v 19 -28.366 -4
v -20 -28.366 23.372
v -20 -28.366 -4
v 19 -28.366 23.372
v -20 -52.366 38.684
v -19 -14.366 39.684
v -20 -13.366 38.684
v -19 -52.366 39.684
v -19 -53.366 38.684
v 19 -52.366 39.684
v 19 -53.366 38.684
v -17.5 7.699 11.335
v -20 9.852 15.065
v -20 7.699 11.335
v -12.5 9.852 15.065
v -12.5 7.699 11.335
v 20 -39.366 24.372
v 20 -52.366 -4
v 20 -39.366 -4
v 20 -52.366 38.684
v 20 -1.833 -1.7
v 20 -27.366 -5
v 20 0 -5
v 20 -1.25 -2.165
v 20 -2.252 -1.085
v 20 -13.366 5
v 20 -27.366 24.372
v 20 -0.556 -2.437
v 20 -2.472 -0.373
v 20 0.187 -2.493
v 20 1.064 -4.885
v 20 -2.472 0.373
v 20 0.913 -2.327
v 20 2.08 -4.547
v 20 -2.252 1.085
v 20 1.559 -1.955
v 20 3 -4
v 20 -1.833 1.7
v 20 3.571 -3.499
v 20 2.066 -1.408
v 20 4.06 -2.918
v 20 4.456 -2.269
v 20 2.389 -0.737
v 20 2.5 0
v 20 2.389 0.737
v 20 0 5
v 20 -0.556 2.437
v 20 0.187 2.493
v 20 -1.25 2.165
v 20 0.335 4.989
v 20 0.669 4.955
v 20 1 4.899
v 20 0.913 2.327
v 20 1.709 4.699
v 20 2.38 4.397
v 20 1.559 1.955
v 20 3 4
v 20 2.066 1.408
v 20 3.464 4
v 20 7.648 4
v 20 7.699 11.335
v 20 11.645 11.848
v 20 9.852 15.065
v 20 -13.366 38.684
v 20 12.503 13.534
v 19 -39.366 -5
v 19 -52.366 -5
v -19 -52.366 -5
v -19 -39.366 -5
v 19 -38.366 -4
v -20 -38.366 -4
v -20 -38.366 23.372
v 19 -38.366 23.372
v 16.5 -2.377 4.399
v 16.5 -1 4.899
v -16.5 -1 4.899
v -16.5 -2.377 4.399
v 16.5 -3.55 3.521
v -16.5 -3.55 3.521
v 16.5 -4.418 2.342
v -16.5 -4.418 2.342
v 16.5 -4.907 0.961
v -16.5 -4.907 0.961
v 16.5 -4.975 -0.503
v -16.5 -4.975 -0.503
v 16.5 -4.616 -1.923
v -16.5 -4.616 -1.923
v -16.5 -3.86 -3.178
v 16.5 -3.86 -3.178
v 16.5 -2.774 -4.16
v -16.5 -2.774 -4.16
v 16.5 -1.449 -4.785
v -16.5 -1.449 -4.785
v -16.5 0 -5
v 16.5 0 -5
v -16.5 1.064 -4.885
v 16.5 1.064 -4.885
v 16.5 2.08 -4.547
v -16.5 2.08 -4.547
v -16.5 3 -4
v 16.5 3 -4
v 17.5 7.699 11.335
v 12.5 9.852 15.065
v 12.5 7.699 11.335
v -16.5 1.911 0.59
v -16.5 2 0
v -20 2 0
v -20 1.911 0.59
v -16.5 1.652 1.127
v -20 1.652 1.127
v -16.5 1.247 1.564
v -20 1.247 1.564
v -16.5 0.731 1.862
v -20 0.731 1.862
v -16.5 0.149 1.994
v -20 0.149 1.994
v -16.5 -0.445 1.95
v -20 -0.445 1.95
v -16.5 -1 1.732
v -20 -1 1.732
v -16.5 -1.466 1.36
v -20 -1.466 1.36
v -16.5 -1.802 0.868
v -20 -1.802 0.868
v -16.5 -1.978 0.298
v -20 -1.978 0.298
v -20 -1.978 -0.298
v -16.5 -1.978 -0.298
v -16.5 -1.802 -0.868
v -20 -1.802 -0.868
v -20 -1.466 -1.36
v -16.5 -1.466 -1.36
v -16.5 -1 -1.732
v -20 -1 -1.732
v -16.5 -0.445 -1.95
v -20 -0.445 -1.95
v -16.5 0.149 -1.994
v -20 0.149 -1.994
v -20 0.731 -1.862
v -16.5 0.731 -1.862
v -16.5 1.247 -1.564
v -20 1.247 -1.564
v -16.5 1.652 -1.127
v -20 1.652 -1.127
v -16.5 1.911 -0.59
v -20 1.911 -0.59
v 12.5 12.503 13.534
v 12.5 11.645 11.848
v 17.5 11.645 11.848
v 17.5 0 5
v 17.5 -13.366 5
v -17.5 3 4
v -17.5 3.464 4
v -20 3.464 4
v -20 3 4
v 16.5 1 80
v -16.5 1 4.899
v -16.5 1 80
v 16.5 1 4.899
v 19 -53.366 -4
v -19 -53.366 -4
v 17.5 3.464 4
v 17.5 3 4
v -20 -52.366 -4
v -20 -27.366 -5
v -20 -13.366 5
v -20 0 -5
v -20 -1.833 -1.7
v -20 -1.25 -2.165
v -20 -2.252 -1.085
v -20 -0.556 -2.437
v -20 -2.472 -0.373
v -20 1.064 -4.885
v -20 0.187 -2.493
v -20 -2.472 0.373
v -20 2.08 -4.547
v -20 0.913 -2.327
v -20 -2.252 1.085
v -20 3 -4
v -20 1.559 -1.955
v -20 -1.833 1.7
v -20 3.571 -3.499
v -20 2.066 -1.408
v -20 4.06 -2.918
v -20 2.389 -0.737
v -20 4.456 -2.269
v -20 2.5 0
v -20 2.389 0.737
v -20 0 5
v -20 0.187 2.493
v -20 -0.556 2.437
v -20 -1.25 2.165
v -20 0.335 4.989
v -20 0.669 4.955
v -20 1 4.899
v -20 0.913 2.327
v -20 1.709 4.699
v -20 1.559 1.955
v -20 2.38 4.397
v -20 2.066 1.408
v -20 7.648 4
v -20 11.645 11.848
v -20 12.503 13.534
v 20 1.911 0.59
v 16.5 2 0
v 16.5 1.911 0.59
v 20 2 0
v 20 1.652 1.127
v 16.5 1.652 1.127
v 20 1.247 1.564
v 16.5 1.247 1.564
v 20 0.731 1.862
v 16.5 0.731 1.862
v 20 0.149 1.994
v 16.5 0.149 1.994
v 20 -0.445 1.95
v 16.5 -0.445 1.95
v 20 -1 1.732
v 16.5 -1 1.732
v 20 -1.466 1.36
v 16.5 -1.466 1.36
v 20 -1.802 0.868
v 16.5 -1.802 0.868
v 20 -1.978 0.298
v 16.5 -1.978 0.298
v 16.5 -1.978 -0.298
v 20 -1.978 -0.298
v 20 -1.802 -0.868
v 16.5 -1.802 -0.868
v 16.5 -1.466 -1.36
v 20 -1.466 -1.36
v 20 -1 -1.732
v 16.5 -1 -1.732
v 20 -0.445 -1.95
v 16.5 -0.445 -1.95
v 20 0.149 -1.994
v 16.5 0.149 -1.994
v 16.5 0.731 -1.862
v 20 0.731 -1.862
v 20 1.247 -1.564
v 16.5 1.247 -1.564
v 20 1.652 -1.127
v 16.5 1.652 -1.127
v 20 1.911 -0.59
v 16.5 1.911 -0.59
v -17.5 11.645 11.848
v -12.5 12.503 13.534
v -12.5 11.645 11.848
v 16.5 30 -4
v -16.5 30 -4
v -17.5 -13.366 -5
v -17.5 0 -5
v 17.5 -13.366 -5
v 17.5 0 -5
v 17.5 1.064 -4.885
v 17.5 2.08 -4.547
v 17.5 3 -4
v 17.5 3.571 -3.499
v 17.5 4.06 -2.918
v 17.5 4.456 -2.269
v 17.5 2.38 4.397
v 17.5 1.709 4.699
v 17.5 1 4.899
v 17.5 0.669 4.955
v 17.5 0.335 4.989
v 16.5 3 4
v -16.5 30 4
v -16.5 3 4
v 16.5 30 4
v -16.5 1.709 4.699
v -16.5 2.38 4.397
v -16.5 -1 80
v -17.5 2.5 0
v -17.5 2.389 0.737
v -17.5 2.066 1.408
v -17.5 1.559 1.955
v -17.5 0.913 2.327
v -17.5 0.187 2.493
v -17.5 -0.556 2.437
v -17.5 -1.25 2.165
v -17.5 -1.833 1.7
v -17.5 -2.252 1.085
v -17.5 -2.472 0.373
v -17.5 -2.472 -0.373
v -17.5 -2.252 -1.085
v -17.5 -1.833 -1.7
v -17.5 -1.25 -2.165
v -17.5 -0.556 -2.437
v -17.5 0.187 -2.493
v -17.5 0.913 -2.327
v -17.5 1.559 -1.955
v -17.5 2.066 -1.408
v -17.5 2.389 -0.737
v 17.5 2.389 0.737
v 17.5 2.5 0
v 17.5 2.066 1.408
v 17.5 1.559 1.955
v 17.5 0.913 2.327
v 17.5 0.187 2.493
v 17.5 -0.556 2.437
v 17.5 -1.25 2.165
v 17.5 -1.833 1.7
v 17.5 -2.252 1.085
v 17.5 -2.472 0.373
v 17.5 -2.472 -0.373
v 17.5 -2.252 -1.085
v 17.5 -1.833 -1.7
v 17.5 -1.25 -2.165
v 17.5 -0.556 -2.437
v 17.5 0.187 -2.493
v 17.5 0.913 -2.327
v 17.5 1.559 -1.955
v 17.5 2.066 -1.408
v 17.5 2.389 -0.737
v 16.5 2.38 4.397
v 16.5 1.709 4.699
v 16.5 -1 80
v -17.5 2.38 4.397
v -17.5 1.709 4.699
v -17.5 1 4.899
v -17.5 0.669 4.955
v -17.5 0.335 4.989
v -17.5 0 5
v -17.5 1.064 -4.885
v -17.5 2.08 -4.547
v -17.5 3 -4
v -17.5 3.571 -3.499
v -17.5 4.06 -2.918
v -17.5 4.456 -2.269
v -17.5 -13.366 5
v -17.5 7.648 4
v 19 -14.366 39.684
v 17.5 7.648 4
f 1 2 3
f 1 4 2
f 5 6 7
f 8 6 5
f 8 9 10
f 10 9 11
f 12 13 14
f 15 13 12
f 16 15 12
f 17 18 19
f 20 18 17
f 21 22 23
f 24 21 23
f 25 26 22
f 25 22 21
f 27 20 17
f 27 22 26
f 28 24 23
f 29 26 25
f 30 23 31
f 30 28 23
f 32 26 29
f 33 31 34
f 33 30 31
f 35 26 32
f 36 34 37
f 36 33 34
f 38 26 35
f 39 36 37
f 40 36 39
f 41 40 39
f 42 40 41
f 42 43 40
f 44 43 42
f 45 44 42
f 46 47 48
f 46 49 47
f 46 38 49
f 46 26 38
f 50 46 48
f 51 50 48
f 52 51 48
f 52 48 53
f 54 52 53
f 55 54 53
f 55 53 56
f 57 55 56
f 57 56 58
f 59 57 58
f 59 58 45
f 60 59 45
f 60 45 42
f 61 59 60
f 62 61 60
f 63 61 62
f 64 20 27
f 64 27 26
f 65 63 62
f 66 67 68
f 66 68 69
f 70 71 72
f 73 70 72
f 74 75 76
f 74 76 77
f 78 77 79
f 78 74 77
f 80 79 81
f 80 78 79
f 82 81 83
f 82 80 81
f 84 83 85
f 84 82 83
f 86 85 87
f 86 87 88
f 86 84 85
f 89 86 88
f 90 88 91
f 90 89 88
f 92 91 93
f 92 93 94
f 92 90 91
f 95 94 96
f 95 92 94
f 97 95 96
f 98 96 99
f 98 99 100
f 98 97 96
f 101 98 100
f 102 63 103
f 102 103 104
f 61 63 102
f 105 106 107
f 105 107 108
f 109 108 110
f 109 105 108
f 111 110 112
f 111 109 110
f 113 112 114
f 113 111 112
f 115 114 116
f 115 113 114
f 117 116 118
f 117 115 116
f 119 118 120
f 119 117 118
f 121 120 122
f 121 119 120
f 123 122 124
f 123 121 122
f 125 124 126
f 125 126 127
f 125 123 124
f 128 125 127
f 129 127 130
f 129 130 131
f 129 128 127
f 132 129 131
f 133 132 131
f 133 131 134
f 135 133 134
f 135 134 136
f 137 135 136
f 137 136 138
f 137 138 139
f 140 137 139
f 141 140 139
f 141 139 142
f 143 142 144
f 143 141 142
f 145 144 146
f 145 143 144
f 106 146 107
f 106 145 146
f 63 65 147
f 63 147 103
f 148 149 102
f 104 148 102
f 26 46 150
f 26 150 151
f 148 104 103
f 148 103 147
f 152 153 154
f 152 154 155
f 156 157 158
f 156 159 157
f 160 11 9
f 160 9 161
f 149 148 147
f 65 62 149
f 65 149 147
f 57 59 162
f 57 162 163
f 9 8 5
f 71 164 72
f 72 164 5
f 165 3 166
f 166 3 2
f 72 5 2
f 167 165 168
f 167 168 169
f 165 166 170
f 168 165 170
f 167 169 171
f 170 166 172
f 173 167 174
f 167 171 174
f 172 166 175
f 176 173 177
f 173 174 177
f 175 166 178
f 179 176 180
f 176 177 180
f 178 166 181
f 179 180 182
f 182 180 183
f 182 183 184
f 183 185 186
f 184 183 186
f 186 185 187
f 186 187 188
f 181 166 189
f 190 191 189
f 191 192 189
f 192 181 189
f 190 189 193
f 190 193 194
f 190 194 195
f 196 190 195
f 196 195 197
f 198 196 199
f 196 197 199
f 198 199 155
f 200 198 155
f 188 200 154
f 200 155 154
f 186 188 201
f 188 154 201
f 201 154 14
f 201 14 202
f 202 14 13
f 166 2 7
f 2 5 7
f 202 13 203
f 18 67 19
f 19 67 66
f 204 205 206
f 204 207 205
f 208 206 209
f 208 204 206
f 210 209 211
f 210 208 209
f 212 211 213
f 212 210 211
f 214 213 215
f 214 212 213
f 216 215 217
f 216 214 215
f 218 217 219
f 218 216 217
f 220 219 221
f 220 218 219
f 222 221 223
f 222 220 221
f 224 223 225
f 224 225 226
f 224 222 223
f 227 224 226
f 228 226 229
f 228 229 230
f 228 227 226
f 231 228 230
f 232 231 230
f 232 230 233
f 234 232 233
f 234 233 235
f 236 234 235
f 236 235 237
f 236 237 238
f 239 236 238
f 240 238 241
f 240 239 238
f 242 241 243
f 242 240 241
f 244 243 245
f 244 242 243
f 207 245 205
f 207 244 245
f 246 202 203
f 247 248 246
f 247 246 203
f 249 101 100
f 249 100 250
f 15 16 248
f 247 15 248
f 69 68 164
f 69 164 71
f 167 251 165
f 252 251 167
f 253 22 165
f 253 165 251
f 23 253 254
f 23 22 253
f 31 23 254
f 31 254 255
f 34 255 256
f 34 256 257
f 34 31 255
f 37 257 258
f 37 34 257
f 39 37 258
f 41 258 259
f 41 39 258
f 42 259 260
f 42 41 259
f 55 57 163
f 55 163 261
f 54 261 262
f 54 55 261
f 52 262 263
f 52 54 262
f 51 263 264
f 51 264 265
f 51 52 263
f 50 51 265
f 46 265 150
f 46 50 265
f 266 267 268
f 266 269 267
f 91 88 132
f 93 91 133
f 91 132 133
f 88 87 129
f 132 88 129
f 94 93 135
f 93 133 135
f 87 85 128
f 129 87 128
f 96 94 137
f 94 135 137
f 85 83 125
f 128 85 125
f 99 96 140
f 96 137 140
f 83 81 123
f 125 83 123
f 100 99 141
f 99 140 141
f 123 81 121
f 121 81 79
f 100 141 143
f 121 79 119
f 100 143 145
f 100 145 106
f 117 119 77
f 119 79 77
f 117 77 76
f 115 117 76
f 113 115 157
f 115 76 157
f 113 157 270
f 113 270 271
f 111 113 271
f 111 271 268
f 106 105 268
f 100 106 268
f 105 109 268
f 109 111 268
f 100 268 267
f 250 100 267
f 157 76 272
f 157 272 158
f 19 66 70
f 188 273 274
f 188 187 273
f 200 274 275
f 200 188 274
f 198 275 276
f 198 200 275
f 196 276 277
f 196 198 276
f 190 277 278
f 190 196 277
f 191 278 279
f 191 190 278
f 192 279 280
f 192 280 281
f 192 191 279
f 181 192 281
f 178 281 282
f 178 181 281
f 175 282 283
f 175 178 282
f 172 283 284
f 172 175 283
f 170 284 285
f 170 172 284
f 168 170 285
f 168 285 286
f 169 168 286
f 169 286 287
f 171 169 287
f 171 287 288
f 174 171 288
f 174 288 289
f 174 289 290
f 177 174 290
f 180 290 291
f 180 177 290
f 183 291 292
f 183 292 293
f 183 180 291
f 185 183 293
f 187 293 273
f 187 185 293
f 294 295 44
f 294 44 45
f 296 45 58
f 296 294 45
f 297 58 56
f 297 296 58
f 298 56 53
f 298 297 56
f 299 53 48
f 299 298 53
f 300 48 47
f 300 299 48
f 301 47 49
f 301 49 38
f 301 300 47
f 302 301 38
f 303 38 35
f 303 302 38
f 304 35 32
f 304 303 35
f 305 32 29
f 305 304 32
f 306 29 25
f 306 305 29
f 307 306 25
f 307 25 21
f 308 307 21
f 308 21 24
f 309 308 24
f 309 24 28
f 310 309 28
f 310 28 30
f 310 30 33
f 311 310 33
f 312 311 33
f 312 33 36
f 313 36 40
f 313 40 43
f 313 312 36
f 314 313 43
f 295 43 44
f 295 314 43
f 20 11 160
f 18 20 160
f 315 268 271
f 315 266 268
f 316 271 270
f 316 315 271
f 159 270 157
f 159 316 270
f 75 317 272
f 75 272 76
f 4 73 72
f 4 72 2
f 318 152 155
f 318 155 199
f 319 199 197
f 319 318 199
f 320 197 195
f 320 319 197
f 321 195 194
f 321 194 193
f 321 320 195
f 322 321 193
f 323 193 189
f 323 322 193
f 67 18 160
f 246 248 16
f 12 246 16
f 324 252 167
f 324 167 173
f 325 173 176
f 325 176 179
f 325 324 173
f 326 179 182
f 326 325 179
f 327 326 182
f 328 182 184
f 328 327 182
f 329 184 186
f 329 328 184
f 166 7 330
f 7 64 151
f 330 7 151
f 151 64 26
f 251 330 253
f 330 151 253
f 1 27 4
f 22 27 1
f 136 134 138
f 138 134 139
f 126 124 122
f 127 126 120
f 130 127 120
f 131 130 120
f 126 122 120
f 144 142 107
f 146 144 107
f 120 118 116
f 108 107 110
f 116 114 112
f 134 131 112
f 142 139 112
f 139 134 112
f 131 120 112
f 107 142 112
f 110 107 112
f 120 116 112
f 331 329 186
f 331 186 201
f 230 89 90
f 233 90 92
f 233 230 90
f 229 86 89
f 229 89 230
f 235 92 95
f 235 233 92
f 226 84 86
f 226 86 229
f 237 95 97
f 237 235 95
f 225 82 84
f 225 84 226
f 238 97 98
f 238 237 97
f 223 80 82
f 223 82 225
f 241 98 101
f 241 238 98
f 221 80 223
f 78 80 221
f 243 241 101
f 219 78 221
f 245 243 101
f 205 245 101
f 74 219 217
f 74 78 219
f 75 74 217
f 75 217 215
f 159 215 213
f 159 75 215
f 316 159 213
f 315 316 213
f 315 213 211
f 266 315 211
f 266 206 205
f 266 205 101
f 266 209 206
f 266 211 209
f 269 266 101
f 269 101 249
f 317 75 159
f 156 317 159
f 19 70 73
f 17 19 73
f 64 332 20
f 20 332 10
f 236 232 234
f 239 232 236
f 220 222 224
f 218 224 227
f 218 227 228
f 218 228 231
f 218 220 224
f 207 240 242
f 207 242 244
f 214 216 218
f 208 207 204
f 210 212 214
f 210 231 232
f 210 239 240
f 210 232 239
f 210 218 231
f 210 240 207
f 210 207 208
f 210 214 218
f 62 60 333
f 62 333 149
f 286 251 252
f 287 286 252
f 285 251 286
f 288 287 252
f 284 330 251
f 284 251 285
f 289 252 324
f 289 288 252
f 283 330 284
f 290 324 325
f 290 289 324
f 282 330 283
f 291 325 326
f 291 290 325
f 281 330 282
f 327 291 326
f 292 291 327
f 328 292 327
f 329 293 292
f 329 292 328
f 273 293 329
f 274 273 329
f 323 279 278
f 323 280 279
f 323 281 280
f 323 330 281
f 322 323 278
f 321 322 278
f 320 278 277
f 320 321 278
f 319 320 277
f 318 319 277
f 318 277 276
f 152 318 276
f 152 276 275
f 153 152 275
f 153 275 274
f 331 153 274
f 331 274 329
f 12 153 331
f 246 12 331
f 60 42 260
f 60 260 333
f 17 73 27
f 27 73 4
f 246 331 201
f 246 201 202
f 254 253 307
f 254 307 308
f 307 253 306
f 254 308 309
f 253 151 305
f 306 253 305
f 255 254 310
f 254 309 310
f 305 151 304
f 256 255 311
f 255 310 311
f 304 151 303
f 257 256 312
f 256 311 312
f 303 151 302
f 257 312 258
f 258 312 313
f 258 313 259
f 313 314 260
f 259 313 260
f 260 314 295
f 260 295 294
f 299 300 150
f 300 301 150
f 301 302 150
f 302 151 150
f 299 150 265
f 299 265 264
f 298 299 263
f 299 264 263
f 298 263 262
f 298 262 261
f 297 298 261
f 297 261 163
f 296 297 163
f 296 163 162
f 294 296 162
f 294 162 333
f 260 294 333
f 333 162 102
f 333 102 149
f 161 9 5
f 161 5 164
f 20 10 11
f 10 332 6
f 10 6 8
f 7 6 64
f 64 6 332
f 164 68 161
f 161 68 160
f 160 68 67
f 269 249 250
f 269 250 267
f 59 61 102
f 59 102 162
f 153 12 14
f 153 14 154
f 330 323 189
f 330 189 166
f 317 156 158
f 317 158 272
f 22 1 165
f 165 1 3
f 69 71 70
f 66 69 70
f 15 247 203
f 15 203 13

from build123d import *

# Parameters (mm, degrees)
F0_R     = 2.5
F1_DEPTH = 20
F2_DEPTH = 17.5
F0_R_2   = 2
F3_DEPTH = 16.5
F4_DEPTH = 20
F5_DEPTH = 12.5
F6_SIZE  = 1


# Not quite as in the source:
# - a feature names something its author has since deleted; it is built from what else it names


with BuildPart() as f1:
    # F0 (on Right) → F1 (new body, symmetric)
    with BuildSketch(Plane.YZ):
        with BuildLine():
            Line((-13.3660271764, -5), (0, -5))
            ThreePointArc((0, -5), (-4.974680765, -0.50254481), (-1, 4.8989794856))
            Line((-1, 4.8989794856), (-1, 5))
            Line((-1, 5), (-13.3660271764, 5))
            Line((-13.3660271764, 5), (-13.3660271764, -5))
        make_face()
        Polygon((-28.3660271764, -5), (-13.3660271764, -5), (-13.3660271764, 5), (-13.3660271764, 39.6839417517), (-53.3660271764, 39.6839417517), (-53.3660271764, 5), (-53.3660271764, -5), (-38.3660271764, -5), (-38.3660271764, 23.3722571284), (-28.3660271764, 23.3722571284), align=None)
        with BuildLine():
            ThreePointArc((-1, 4.8989794856), (-4.974680765, -0.50254481), (0, -5))
            ThreePointArc((0, -5), (1.5811388301, -4.7434164903), (3, -4))
            Line((3, -4), (3, 4))
            ThreePointArc((3, 4), (2.0498880528, 4.5604779323), (1, 4.8989794856))
            Line((1, 4.8989794856), (-1, 4.8989794856))
        make_face()
        Circle(F0_R, mode=Mode.SUBTRACT)
        with BuildLine():
            ThreePointArc((0, 5), (-0.50254481, 4.974680765), (-1, 4.8989794856))
            Line((-1, 4.8989794856), (1, 4.8989794856))
            ThreePointArc((1, 4.8989794856), (0.50254481, 4.974680765), (0, 5))
        make_face()
        with BuildLine():
            Line((-1, 5), (-1, 4.8989794856))
            ThreePointArc((-1, 4.8989794856), (-0.50254481, 4.974680765), (0, 5))
            Line((0, 5), (-1, 5))
        make_face()
        with BuildLine():
            Line((3, 4), (3, -4))
            ThreePointArc((3, -4), (3.8269094248, -3.2178819516), (4.4555102649, -2.2690148257))
            ThreePointArc((4.4555102649, -2.2690148257), (4.8619724045, -1.1667151914), (5, 0))
            ThreePointArc((5, 0), (4.5594723232, 2.0521238105), (3.3155151466, 3.7426406871))
            ThreePointArc((3.3155151466, 3.7426406871), (3.1603783548, 3.8745333467), (3, 4))
        make_face()
        Polygon((-28.3660271764, -5), (-13.3660271764, -5), (-13.3660271764, 5), (-13.3660271764, 39.6839417517), (-53.3660271764, 39.6839417517), (-53.3660271764, 5), (-53.3660271764, -5), (-38.3660271764, -5), (-38.3660271764, 23.3722571284), (-28.3660271764, 23.3722571284), align=None)
        with BuildLine():
            Line((3.4641016151, 4), (3, 4))
            ThreePointArc((3, 4), (3.1603783548, 3.8745333467), (3.3155151466, 3.7426406871))
            Line((3.3155151466, 3.7426406871), (3.4641016151, 4))
        make_face()
        with BuildLine():
            ThreePointArc((5, 0), (4.8619724045, -1.1667151914), (4.4555102649, -2.2690148257))
            Line((4.4555102649, -2.2690148257), (7.6480711023, 4))
            Line((7.6480711023, 4), (3.4641016151, 4))
            Line((3.4641016151, 4), (3.3155151466, 3.7426406871))
            ThreePointArc((3.3155151466, 3.7426406871), (4.5594723232, 2.0521238105), (5, 0))
        make_face()
        Polygon((7.6988384706, 11.3347793903), (11.6449917103, 11.8484814621), (12.5034797738, 13.5342361498), (9.8523915105, 15.0648426723), align=None)
        Polygon((3.4641016151, 4), (7.6480711023, 4), (11.6449917103, 11.8484814621), (7.6988384706, 11.3347793903), align=None)
    extrude(amount=F1_DEPTH, both=True)

    # F0 (on Right) → F2 (cut, symmetric)
    with BuildSketch(Plane.YZ):
        with BuildLine():
            Line((-13.3660271764, -5), (0, -5))
            ThreePointArc((0, -5), (-4.974680765, -0.50254481), (-1, 4.8989794856))
            Line((-1, 4.8989794856), (-1, 5))
            Line((-1, 5), (-13.3660271764, 5))
            Line((-13.3660271764, 5), (-13.3660271764, -5))
        make_face()
        with BuildLine():
            ThreePointArc((-1, 4.8989794856), (-4.974680765, -0.50254481), (0, -5))
            ThreePointArc((0, -5), (1.5811388301, -4.7434164903), (3, -4))
            Line((3, -4), (3, 4))
            ThreePointArc((3, 4), (2.0498880528, 4.5604779323), (1, 4.8989794856))
            Line((1, 4.8989794856), (-1, 4.8989794856))
        make_face()
        Circle(F0_R, mode=Mode.SUBTRACT)
        with BuildLine():
            Line((-1, 5), (-1, 4.8989794856))
            ThreePointArc((-1, 4.8989794856), (-0.50254481, 4.974680765), (0, 5))
            Line((0, 5), (-1, 5))
        make_face()
        with BuildLine():
            ThreePointArc((0, 5), (-0.50254481, 4.974680765), (-1, 4.8989794856))
            Line((-1, 4.8989794856), (1, 4.8989794856))
            ThreePointArc((1, 4.8989794856), (0.50254481, 4.974680765), (0, 5))
        make_face()
        with BuildLine():
            Line((3, 4), (3, -4))
            ThreePointArc((3, -4), (3.8269094248, -3.2178819516), (4.4555102649, -2.2690148257))
            ThreePointArc((4.4555102649, -2.2690148257), (4.8619724045, -1.1667151914), (5, 0))
            ThreePointArc((5, 0), (4.5594723232, 2.0521238105), (3.3155151466, 3.7426406871))
            ThreePointArc((3.3155151466, 3.7426406871), (3.1603783548, 3.8745333467), (3, 4))
        make_face()
        Polygon((3.4641016151, 4), (7.6480711023, 4), (11.6449917103, 11.8484814621), (7.6988384706, 11.3347793903), align=None)
        with BuildLine():
            ThreePointArc((5, 0), (4.8619724045, -1.1667151914), (4.4555102649, -2.2690148257))
            Line((4.4555102649, -2.2690148257), (7.6480711023, 4))
            Line((7.6480711023, 4), (3.4641016151, 4))
            Line((3.4641016151, 4), (3.3155151466, 3.7426406871))
            ThreePointArc((3.3155151466, 3.7426406871), (4.5594723232, 2.0521238105), (5, 0))
        make_face()
        with BuildLine():
            Line((3.4641016151, 4), (3, 4))
            ThreePointArc((3, 4), (3.1603783548, 3.8745333467), (3.3155151466, 3.7426406871))
            Line((3.3155151466, 3.7426406871), (3.4641016151, 4))
        make_face()
    extrude(amount=F2_DEPTH, both=True, mode=Mode.SUBTRACT)

    # F0 (on Right) → F5 (cut, symmetric)
    with BuildSketch(Plane.YZ):
        Polygon((7.6988384706, 11.3347793903), (11.6449917103, 11.8484814621), (12.5034797738, 13.5342361498), (9.8523915105, 15.0648426723), align=None)
    extrude(amount=F5_DEPTH, both=True, mode=Mode.SUBTRACT)

    # F6
    f6_edges = [f1.edges().sort_by_distance(p)[0] for p in [
        (0, -53.366027, 39.683942),
        (20, -33.366027, 39.683942),
        (0, -13.366027, 39.683942),
        (-20, -33.366027, 39.683942),
        (20, -53.366027, 17.341971),
        (20, -45.866027, -5),
        (0, -38.366027, -5),
        (0, -28.366027, -5),
        (20, -38.366027, 9.186129),
        (20, -33.366027, 23.372257),
        (20, -28.366027, 9.186129),
        (0, -53.366027, -5),
        (-20, -45.866027, -5),
        (-20, -53.366027, 17.341971),
    ]]
    chamfer(f6_edges, length=F6_SIZE)


with BuildPart() as f3:
    # F0 (on Right) → F3 (new body, symmetric)
    with BuildSketch(Plane.YZ):
        with BuildLine():
            Line((-1, 5), (0, 5))
            ThreePointArc((0, 5), (0.50254481, 4.974680765), (1, 4.8989794856))
            Line((1, 4.8989794856), (1, 80))
            Line((1, 80), (-1, 80))
            Line((-1, 80), (-1, 5))
        make_face()
        with BuildLine():
            Line((-1, 5), (-1, 4.8989794856))
            ThreePointArc((-1, 4.8989794856), (-0.50254481, 4.974680765), (0, 5))
            Line((0, 5), (-1, 5))
        make_face()
        with BuildLine():
            ThreePointArc((0, 5), (-0.50254481, 4.974680765), (-1, 4.8989794856))
            Line((-1, 4.8989794856), (1, 4.8989794856))
            ThreePointArc((1, 4.8989794856), (0.50254481, 4.974680765), (0, 5))
        make_face()
        with BuildLine():
            ThreePointArc((-1, 4.8989794856), (-4.974680765, -0.50254481), (0, -5))
            ThreePointArc((0, -5), (1.5811388301, -4.7434164903), (3, -4))
            Line((3, -4), (3, 4))
            ThreePointArc((3, 4), (2.0498880528, 4.5604779323), (1, 4.8989794856))
            Line((1, 4.8989794856), (-1, 4.8989794856))
        make_face()
        Circle(F0_R, mode=Mode.SUBTRACT)
        with BuildLine():
            Line((3, 4), (3, -4))
            ThreePointArc((3, -4), (3.8269094248, -3.2178819516), (4.4555102649, -2.2690148257))
            ThreePointArc((4.4555102649, -2.2690148257), (4.8619724045, -1.1667151914), (5, 0))
            ThreePointArc((5, 0), (4.5594723232, 2.0521238105), (3.3155151466, 3.7426406871))
            ThreePointArc((3.3155151466, 3.7426406871), (3.1603783548, 3.8745333467), (3, 4))
        make_face()
        Circle(F0_R)
        Circle(F0_R_2, mode=Mode.SUBTRACT)
        Circle(F0_R_2)
        with BuildLine():
            ThreePointArc((4.4555102649, -2.2690148257), (3.8269094248, -3.2178819516), (3, -4))
            Line((3, -4), (30, -4))
            Line((30, -4), (30, 4))
            Line((30, 4), (7.6480711023, 4))
            Line((7.6480711023, 4), (4.4555102649, -2.2690148257))
        make_face()
        with BuildLine():
            ThreePointArc((5, 0), (4.8619724045, -1.1667151914), (4.4555102649, -2.2690148257))
            Line((4.4555102649, -2.2690148257), (7.6480711023, 4))
            Line((7.6480711023, 4), (3.4641016151, 4))
            Line((3.4641016151, 4), (3.3155151466, 3.7426406871))
            ThreePointArc((3.3155151466, 3.7426406871), (4.5594723232, 2.0521238105), (5, 0))
        make_face()
        with BuildLine():
            Line((3.4641016151, 4), (3, 4))
            ThreePointArc((3, 4), (3.1603783548, 3.8745333467), (3.3155151466, 3.7426406871))
            Line((3.3155151466, 3.7426406871), (3.4641016151, 4))
        make_face()
    extrude(amount=F3_DEPTH, both=True)

    # F0 (on Right) → F4 (join, symmetric)
    with BuildSketch(Plane.YZ):
        Circle(F0_R_2)
    extrude(amount=F4_DEPTH, both=True)


solid = Compound([f1.part, f3.part])
